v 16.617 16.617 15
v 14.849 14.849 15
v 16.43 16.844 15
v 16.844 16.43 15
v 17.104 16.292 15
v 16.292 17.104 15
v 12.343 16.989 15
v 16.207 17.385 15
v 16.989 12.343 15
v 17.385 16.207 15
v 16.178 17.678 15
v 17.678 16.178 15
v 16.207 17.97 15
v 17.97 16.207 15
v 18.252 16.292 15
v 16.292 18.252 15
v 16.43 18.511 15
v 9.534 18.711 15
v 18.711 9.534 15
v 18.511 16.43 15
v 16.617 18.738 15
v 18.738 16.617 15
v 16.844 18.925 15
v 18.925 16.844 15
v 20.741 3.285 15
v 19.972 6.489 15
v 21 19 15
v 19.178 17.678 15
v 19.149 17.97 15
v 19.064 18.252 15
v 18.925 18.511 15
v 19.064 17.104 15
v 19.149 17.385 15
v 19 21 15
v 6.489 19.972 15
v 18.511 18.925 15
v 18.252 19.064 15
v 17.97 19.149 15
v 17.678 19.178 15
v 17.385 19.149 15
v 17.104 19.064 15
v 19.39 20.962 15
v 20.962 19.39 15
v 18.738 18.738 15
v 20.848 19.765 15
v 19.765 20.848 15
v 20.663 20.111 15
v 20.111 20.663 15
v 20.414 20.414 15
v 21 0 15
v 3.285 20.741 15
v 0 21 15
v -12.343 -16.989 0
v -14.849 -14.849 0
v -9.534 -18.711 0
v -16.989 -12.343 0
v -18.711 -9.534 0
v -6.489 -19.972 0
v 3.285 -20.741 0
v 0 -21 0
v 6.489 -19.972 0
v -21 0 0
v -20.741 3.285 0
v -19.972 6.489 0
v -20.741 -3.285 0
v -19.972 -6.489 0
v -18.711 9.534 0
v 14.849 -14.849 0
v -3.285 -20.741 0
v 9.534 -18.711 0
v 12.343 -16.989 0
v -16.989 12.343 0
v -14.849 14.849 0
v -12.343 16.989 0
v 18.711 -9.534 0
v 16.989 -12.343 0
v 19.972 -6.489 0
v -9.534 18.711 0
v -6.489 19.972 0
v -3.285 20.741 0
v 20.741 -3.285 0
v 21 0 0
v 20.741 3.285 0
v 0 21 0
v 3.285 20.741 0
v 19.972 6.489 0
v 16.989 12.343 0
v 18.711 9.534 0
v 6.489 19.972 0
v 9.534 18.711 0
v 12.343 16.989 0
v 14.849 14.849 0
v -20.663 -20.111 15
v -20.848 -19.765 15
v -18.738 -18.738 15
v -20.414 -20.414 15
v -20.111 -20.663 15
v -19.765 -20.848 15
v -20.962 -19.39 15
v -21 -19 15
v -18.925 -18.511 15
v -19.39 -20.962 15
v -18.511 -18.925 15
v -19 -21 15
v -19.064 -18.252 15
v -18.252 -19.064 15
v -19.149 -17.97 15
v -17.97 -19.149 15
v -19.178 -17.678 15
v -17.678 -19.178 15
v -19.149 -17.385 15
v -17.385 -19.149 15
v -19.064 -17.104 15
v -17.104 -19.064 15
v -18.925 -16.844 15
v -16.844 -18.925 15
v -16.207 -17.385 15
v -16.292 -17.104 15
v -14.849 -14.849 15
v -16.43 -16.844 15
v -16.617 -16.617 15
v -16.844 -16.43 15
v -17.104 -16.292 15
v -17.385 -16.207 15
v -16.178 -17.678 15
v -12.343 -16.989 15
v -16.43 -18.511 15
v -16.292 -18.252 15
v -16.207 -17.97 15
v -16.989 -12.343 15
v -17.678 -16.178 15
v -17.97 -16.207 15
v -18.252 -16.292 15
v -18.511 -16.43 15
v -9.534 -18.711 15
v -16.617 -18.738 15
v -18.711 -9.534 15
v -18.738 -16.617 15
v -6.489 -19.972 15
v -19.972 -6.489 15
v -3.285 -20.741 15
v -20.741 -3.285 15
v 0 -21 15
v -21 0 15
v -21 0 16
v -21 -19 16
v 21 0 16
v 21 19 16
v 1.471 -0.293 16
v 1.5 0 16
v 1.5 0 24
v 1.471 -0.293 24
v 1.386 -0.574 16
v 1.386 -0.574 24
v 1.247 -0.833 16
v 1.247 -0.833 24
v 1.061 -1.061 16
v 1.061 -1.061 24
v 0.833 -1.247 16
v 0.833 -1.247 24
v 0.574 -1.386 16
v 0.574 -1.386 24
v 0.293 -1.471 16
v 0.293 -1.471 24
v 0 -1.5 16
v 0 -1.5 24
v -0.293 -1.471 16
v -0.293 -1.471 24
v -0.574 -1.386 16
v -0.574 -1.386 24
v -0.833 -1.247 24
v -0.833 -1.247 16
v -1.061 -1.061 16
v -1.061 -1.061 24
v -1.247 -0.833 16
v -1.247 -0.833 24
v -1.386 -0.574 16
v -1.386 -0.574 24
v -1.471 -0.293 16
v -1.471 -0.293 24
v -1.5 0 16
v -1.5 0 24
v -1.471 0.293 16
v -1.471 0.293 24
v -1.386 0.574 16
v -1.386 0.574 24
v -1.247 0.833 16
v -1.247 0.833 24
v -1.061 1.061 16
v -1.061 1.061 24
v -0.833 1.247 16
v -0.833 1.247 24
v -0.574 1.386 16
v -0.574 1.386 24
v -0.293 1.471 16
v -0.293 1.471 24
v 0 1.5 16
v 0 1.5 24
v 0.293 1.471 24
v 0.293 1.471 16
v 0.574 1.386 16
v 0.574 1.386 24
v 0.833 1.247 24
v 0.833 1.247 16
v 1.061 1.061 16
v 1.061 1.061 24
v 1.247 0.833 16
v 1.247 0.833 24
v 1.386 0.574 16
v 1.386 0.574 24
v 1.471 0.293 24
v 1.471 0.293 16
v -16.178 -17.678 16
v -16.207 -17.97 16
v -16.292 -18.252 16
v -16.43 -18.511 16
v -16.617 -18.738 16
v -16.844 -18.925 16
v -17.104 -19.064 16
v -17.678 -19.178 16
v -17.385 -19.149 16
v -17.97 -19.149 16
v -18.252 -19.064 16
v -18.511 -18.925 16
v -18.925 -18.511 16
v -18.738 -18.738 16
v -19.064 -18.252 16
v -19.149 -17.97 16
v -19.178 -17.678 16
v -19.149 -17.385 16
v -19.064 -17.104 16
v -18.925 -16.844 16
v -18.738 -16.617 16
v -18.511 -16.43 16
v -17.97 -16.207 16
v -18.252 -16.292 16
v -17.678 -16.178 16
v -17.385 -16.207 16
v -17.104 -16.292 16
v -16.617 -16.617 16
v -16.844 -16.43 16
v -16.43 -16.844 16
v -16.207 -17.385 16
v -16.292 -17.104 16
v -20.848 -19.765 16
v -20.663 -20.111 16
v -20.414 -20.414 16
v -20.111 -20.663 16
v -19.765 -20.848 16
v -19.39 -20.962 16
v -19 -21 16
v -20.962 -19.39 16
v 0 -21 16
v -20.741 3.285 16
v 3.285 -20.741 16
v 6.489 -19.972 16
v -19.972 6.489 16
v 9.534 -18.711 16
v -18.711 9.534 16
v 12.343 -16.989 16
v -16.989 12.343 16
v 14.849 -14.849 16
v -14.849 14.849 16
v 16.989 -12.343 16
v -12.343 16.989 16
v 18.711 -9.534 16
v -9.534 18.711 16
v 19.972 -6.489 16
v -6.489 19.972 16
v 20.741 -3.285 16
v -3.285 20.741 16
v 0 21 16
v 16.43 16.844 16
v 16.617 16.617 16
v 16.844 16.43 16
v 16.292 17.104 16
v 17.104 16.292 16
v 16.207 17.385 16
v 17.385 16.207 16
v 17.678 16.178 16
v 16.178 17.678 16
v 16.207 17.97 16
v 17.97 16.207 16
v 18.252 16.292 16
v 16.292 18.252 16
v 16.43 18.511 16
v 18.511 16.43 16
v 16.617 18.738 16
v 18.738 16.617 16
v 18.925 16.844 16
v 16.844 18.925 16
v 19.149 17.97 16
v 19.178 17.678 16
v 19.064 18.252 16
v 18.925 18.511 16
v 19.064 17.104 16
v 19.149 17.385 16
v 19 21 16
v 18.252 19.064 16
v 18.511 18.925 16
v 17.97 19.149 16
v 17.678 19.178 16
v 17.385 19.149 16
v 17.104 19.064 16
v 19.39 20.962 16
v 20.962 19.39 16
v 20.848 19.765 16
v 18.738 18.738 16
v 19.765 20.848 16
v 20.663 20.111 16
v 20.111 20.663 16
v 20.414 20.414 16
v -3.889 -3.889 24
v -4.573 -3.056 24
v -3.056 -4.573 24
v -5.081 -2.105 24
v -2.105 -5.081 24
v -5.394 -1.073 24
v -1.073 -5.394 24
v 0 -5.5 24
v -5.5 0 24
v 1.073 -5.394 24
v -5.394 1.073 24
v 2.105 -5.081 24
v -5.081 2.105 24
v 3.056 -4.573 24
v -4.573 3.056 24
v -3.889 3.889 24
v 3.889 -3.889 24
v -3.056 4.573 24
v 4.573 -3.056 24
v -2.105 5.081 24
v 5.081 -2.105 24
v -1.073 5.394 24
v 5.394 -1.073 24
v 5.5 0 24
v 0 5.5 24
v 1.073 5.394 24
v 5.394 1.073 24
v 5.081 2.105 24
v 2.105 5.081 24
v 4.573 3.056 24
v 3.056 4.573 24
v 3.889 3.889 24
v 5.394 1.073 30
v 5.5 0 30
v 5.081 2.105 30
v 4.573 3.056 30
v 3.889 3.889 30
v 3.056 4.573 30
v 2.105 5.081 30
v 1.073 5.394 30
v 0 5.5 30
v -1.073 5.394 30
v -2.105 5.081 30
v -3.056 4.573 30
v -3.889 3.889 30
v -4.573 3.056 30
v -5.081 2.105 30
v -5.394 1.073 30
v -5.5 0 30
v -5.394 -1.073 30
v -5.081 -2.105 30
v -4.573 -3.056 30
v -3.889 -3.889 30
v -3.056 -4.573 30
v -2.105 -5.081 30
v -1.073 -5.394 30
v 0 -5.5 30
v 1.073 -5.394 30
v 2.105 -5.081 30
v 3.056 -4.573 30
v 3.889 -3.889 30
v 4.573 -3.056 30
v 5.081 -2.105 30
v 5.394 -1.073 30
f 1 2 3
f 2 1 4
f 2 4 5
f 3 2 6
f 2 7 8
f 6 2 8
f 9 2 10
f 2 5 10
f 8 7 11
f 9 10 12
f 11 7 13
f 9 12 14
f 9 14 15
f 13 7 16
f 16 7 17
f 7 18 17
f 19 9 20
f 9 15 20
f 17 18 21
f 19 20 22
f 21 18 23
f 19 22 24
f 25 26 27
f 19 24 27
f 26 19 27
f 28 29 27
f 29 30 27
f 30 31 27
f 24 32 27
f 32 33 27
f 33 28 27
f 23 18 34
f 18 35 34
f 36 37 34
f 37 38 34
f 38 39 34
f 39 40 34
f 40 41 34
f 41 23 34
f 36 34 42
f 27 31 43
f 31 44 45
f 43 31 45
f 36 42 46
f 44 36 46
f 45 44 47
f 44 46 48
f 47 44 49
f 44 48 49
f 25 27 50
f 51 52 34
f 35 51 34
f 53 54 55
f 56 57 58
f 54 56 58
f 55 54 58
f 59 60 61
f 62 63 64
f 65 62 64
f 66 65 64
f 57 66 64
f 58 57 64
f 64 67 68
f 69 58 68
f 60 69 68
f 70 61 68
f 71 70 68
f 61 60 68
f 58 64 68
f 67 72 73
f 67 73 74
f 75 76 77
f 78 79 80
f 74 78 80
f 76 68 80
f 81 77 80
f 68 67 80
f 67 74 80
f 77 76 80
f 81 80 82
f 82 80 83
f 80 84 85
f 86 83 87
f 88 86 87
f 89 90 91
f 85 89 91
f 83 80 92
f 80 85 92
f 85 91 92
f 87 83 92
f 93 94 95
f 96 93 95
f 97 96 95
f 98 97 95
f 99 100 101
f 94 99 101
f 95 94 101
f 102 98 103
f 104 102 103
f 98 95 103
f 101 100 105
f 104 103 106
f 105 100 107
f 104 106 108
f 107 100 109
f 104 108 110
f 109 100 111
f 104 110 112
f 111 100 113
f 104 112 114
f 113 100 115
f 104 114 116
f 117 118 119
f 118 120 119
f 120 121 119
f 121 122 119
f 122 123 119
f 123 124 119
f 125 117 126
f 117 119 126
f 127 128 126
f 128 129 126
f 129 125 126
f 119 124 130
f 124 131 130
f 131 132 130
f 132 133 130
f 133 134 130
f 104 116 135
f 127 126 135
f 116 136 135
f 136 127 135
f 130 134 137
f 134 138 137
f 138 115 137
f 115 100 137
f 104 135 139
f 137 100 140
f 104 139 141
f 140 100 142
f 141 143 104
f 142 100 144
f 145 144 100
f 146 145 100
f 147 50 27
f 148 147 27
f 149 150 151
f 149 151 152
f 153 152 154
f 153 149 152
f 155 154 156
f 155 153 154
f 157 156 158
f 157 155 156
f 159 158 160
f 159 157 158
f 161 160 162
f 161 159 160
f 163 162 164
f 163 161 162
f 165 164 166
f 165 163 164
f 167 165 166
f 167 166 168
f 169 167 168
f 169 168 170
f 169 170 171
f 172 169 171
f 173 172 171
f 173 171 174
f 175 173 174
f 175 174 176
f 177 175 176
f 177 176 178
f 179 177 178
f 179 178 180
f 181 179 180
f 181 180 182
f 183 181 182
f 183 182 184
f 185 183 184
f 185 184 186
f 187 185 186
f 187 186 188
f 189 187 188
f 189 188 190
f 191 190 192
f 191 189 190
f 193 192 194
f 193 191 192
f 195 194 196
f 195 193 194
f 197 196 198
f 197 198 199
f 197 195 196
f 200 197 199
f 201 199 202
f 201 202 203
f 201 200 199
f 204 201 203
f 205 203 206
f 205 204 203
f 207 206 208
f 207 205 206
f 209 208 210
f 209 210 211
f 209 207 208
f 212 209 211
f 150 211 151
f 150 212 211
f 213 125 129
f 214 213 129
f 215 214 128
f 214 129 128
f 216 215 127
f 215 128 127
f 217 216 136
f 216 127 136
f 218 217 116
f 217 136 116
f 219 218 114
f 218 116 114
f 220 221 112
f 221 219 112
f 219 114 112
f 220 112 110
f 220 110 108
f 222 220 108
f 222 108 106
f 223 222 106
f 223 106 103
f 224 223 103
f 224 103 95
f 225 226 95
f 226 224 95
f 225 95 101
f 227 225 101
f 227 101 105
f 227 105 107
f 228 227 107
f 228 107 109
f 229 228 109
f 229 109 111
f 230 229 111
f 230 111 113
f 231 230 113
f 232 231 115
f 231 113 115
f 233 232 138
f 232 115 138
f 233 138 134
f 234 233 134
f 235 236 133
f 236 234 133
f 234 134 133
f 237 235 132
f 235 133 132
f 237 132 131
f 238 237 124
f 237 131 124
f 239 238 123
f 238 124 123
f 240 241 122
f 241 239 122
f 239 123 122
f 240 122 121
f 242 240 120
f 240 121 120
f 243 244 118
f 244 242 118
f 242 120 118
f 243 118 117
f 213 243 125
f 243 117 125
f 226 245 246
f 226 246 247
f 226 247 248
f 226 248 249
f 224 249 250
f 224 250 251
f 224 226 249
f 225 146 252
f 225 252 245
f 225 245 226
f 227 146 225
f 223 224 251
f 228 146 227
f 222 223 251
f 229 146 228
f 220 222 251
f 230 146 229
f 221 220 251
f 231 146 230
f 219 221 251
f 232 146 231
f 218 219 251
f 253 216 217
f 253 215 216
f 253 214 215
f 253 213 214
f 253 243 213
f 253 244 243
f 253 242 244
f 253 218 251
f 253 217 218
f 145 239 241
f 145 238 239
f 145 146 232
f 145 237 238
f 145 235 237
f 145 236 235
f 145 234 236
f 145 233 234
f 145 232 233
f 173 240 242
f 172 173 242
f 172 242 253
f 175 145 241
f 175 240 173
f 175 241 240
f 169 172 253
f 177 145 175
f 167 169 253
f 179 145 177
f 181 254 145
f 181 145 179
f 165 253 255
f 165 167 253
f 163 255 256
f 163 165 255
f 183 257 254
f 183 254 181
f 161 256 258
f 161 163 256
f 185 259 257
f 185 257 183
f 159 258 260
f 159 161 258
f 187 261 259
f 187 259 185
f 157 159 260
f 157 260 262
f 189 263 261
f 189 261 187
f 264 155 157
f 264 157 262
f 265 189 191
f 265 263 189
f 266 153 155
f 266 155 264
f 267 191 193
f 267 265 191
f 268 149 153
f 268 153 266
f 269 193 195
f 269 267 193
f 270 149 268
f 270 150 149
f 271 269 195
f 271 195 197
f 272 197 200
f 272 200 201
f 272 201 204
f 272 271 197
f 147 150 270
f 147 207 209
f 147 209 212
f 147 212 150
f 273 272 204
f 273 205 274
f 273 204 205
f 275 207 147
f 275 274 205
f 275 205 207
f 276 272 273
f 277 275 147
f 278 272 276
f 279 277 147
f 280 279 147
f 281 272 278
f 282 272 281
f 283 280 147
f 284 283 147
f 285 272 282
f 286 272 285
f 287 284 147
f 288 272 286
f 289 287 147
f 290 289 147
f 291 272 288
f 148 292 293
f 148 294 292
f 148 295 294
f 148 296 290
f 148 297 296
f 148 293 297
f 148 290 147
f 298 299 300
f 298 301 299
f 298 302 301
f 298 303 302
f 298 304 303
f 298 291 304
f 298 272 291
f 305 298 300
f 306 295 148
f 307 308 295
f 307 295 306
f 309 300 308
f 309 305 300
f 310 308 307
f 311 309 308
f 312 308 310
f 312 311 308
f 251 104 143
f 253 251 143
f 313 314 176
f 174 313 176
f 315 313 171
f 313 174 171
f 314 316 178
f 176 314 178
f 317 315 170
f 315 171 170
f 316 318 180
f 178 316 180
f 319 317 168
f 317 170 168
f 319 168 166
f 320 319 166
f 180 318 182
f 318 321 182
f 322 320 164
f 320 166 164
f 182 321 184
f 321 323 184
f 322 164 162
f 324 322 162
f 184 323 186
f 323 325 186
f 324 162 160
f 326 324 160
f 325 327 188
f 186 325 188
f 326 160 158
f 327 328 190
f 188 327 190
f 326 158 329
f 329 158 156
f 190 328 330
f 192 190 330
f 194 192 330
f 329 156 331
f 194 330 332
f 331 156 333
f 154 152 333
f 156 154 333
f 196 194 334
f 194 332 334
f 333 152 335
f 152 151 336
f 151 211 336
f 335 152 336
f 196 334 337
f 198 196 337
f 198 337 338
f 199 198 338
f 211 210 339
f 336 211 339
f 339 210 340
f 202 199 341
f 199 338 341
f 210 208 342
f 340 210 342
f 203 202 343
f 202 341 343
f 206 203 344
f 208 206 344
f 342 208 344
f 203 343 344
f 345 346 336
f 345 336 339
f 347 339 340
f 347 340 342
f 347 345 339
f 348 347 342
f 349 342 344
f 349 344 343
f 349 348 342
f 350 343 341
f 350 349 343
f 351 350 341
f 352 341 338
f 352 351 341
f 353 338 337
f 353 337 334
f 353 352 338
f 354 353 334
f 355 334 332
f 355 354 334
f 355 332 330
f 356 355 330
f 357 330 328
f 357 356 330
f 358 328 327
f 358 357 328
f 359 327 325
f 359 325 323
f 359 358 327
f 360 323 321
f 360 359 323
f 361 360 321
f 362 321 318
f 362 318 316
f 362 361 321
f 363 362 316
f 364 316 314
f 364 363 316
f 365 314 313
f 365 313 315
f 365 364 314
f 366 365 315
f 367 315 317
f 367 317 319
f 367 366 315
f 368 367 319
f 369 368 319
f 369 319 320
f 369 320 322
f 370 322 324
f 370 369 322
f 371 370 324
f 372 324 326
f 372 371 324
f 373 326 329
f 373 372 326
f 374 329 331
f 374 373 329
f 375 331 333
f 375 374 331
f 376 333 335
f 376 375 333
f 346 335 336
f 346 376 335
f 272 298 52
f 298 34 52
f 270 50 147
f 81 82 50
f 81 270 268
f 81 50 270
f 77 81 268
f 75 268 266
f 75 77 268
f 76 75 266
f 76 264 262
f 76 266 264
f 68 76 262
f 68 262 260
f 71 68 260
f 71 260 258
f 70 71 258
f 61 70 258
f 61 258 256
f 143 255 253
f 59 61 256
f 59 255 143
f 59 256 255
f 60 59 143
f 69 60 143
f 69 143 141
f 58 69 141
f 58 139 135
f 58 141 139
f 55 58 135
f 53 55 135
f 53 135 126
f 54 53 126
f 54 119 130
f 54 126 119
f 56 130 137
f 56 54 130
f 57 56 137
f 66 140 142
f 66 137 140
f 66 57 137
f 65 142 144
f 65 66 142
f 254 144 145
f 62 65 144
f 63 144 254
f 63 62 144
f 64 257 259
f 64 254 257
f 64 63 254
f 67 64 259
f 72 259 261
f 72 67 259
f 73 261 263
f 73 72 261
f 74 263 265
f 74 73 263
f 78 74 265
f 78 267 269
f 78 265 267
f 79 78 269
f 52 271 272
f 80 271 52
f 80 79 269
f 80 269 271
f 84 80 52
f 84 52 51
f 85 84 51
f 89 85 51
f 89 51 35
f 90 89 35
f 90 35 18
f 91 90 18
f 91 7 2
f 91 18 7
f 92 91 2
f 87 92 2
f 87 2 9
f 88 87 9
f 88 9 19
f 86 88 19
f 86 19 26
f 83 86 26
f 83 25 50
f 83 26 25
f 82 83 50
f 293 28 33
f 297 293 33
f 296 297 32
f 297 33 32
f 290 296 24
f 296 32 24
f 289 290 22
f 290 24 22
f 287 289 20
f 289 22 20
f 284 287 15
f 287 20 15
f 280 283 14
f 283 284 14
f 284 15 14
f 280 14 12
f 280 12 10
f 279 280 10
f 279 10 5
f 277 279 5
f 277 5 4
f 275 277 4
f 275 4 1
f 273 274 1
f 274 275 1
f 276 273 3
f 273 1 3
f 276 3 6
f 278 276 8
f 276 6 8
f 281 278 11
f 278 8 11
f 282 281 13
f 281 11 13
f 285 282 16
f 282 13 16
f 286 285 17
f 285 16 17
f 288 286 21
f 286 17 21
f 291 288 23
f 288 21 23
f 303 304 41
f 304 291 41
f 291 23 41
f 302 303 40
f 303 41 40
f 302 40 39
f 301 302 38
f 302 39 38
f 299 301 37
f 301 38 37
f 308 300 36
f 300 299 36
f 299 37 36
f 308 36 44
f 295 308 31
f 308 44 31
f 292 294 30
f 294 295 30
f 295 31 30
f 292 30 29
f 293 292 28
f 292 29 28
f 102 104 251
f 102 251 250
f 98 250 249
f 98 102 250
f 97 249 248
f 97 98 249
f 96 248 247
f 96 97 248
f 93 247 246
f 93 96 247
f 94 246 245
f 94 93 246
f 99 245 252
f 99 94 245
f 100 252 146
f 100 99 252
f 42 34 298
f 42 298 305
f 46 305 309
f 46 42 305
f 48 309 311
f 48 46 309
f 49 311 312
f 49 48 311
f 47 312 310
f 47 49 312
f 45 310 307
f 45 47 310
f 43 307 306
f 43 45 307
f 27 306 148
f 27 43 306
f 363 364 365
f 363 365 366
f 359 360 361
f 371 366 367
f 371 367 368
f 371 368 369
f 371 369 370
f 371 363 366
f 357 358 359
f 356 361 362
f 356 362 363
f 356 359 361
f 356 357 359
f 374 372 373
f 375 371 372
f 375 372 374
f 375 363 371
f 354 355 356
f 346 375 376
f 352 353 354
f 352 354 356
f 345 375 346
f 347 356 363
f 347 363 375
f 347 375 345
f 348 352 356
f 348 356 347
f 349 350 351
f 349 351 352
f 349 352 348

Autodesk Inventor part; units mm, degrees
ref_plane "YZ Plane" through (0, 0, 0) normal (1, 0, 0) x (0, 1, 0)
ref_plane "XZ Plane" through (0, 0, 0) normal (0, 1, 0) x (-1, 0, 0)
ref_plane "XY Plane" through (0, 0, 0) normal (0, 0, 1) x (1, 0, 0)
sketch "Sketch1" plane through (0, 0, 0) normal (0, 0, 1) x (1, 0, 0)
  circle A0 centre (0, 0) radius 21
  dimension "d0" = 42
extrude "Extrusion1" add sketch "Sketch1" along normal blind 15
sketch "Sketch2" plane through (0, 0, 15) normal (0, 0, 1) x (1, 0, 0)
  circle A0 centre (0, 0) radius 21 construction
  circle A1 centre (0, 0) radius 1.5
  dimension "d3" = 3
extrude "Extrusion2" add sketch "Sketch2" along normal blind 15
sketch "Sketch3" plane through (0, 0, 15) normal (0, 0, 1) x (1, 0, 0)
  circle A0 centre (0, 0) radius 1.5 construction
  circle A1 centre (0, 0) radius 21 construction
  line L0 (-19, -21) -> (0, -21)
  line L1 (21, 0) -> (21, 19)
  line L2 (19, 21) -> (0, 21)
  line L3 (-21, 0) -> (-21, -19)
  line L4 (-21, -21) -> (21, 21) construction
  line L5 (21, -21) -> (-21, 21) construction
  circle A2 centre (0, 0) radius 21 projected
  arc A3 (21, 19) -> (19, 21) centre (19, 19) ccw
  arc A4 (-21, -19) -> (-19, -21) centre (-19, -19) ccw
  circle A5 centre (-17.6777, -17.6777) radius 1.5
  circle A6 centre (17.6777, 17.6777) radius 1.5
  point P0 (0, 0)
  dimension "d6" = 2
  dimension "d7" = 3
  dimension "d8" = 3
  dimension "d9" = 25
  dimension "d10" = 25
extrude "Extrusion3" add sketch "Sketch3" along normal blind 1
sketch "Sketch4" plane through (0, 0, 30) normal (0, 0, 1) x (1, 0, 0)
  circle A0 centre (0, 0) radius 5.5
  dimension "d13" = 11
extrude "Extrusion4" add sketch "Sketch4" against normal blind 6
equation "\"d10\" = d9"
properties part number "stepper motor 1"
